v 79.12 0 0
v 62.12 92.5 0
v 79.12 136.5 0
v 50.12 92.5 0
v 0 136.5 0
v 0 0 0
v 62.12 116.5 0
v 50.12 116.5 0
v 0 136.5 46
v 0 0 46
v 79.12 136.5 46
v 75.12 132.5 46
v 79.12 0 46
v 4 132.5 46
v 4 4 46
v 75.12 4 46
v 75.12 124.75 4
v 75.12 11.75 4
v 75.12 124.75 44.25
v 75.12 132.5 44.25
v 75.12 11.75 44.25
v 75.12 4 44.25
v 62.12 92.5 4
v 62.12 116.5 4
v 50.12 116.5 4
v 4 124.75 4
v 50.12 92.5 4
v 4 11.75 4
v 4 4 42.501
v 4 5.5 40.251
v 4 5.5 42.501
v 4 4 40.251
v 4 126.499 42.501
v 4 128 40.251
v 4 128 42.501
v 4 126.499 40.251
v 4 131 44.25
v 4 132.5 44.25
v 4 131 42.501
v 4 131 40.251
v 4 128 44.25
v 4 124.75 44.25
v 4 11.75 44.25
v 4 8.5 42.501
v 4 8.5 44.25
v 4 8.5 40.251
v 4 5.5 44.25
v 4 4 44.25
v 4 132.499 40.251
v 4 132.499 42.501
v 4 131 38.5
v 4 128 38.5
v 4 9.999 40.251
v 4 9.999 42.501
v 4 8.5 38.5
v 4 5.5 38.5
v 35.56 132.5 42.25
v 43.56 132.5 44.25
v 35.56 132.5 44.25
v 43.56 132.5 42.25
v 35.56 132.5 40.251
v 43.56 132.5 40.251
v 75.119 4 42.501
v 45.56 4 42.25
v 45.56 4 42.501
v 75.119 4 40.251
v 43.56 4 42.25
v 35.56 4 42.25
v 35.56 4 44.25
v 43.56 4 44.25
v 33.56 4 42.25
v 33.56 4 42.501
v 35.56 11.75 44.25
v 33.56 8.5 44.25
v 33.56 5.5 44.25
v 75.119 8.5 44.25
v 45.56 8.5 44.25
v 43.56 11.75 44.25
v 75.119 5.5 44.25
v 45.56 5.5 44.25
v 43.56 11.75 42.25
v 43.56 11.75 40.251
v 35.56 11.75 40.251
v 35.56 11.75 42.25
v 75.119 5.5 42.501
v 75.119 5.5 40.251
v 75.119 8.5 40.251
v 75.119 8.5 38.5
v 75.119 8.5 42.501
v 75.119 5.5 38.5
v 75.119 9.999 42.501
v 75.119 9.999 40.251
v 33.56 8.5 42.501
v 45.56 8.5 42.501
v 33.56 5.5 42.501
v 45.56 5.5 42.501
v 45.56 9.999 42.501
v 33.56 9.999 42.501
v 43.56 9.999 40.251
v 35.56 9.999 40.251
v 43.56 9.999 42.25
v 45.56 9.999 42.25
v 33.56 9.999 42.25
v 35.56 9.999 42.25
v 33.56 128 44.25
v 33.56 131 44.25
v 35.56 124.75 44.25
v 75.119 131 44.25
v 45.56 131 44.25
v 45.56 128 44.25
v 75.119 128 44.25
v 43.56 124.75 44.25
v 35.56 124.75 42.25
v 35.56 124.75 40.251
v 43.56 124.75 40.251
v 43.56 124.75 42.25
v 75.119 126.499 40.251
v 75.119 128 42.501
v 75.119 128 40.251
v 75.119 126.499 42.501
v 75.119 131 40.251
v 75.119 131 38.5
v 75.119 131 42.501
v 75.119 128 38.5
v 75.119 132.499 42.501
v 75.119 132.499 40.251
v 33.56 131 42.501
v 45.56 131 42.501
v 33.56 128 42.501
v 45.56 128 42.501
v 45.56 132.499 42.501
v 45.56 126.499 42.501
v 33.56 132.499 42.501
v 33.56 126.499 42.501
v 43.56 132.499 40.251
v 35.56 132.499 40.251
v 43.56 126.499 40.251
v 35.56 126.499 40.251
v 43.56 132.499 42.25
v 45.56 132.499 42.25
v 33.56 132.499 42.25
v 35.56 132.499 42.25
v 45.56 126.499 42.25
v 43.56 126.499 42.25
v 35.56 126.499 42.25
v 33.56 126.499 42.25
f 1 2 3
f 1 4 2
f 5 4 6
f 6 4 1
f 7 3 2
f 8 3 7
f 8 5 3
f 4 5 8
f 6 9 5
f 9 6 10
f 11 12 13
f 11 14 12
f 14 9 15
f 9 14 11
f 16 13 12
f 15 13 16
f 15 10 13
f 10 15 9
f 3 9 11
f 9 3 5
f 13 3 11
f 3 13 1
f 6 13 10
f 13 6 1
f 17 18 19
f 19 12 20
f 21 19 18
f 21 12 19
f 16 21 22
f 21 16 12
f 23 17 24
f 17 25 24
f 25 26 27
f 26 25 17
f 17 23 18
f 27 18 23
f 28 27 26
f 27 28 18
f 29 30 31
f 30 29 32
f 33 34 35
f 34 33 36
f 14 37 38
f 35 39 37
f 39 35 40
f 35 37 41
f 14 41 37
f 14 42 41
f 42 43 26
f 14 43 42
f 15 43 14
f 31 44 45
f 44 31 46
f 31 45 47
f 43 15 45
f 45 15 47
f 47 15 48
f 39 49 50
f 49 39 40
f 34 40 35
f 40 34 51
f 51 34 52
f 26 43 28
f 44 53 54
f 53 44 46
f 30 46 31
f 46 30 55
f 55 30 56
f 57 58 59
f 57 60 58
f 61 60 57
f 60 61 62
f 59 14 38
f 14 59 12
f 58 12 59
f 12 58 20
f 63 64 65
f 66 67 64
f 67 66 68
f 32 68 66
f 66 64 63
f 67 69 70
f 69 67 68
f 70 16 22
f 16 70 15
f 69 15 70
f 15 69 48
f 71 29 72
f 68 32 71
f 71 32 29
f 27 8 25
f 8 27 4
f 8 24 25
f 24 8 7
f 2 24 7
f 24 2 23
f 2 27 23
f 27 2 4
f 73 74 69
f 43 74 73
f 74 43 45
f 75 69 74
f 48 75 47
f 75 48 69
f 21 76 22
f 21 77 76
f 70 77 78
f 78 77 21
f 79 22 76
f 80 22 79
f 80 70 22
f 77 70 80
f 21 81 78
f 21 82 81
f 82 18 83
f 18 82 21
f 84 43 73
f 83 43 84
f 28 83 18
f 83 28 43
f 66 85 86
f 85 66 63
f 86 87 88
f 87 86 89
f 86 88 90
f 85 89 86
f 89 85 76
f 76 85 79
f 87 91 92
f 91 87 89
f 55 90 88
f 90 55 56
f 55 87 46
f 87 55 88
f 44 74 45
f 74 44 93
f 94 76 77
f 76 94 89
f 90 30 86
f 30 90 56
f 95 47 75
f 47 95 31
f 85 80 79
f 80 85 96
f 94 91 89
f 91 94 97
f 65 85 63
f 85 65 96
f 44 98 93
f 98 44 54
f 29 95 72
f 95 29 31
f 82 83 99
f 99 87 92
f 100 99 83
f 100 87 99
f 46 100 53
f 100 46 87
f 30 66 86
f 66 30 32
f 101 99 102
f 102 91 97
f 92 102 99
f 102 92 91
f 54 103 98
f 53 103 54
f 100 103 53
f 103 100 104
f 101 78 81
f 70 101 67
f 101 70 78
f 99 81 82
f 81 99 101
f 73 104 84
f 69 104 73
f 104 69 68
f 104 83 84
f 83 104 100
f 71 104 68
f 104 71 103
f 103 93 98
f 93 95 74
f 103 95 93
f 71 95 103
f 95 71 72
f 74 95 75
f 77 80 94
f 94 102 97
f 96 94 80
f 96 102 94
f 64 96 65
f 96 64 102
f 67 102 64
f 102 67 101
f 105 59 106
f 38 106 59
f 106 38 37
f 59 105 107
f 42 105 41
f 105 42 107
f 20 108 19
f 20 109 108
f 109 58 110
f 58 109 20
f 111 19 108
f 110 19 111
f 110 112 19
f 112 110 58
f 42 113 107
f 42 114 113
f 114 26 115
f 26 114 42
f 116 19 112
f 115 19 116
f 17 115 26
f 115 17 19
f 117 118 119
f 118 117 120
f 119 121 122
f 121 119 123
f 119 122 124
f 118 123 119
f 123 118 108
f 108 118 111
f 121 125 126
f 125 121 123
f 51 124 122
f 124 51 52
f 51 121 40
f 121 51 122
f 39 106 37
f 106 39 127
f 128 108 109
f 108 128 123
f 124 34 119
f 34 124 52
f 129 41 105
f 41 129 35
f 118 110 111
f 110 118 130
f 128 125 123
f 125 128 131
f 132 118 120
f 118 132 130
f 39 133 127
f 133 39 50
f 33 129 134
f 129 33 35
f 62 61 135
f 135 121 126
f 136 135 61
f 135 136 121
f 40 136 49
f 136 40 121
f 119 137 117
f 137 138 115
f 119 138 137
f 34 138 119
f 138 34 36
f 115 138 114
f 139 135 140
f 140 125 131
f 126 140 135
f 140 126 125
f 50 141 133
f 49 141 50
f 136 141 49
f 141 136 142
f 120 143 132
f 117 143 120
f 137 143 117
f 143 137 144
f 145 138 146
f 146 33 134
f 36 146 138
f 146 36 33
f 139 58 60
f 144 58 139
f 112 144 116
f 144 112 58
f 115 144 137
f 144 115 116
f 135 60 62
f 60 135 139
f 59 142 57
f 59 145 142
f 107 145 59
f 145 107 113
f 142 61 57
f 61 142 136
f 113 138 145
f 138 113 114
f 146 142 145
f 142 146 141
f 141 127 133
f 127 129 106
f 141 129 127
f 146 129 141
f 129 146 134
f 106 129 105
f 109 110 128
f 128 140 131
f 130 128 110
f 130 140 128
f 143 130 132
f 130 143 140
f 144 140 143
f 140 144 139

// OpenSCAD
$fn = 128;

3U = 128.5;
HP = 5.08;

dx = 0.001;

connector_footprint = [12, 24];
border = 4;
pt = 1.75;
layer = 0.25;

module box(hp, height) {
	w = hp * HP;
	nut = [6, 6, 2];

	module hole() {
		linear_extrude(height = border + dx * 2)
		square(size = connector_footprint);
	}

	module rail() {
		h = height - border - pt;
		rail = [3, pt * 2 + nut.y, 4];
		rail_entrance = [nut.x + 2, rail.y + dx * 2, rail.z];

		union() {
			difference() {
				cube([hp * HP, rail.y, h]);
	
				translate([-dx, (rail.y - rail.x) / 2, h - rail.z - pt])
				cube([w, rail.x, rail.z + pt + dx]);
	
				translate([
					-dx, 
					pt - dx,
					h - rail.z + dx
				])
				cube([w, rail.y - pt * 2, rail.z - pt]);
		
				translate([
					(w - rail_entrance.x) / 2, 
					-dx,
					h - rail_entrance.z + dx
				])
				cube(rail_entrance);	
			}

			translate([(w - rail_entrance.x) / 2 - 2, 0, h - 2])
			cube([2, rail.y, 2]);

			translate([(w + rail_entrance.x) / 2, 0, h - 2])
			cube([2, rail.y, 2]);
		}
	}

	module box() {
		difference() {
			linear_extrude(height = height)
			square(size = [w + border * 2, 3U + border * 2]);
			
			// main volume
			translate([border, border, border])
			cube([w, 3U, height]);
	
			translate([border, border, -dx])
			translate([
				w - connector_footprint.x - 13, 
				3U - connector_footprint.y - 16
			])
			hole();
		}
	}

	color("#ffffff")
	union() {
		box();
		translate([border, border - pt, border]) rail();
		translate([border, border + 3U - nut.y - pt, border]) rail();
	}
}

box(14, 46);
